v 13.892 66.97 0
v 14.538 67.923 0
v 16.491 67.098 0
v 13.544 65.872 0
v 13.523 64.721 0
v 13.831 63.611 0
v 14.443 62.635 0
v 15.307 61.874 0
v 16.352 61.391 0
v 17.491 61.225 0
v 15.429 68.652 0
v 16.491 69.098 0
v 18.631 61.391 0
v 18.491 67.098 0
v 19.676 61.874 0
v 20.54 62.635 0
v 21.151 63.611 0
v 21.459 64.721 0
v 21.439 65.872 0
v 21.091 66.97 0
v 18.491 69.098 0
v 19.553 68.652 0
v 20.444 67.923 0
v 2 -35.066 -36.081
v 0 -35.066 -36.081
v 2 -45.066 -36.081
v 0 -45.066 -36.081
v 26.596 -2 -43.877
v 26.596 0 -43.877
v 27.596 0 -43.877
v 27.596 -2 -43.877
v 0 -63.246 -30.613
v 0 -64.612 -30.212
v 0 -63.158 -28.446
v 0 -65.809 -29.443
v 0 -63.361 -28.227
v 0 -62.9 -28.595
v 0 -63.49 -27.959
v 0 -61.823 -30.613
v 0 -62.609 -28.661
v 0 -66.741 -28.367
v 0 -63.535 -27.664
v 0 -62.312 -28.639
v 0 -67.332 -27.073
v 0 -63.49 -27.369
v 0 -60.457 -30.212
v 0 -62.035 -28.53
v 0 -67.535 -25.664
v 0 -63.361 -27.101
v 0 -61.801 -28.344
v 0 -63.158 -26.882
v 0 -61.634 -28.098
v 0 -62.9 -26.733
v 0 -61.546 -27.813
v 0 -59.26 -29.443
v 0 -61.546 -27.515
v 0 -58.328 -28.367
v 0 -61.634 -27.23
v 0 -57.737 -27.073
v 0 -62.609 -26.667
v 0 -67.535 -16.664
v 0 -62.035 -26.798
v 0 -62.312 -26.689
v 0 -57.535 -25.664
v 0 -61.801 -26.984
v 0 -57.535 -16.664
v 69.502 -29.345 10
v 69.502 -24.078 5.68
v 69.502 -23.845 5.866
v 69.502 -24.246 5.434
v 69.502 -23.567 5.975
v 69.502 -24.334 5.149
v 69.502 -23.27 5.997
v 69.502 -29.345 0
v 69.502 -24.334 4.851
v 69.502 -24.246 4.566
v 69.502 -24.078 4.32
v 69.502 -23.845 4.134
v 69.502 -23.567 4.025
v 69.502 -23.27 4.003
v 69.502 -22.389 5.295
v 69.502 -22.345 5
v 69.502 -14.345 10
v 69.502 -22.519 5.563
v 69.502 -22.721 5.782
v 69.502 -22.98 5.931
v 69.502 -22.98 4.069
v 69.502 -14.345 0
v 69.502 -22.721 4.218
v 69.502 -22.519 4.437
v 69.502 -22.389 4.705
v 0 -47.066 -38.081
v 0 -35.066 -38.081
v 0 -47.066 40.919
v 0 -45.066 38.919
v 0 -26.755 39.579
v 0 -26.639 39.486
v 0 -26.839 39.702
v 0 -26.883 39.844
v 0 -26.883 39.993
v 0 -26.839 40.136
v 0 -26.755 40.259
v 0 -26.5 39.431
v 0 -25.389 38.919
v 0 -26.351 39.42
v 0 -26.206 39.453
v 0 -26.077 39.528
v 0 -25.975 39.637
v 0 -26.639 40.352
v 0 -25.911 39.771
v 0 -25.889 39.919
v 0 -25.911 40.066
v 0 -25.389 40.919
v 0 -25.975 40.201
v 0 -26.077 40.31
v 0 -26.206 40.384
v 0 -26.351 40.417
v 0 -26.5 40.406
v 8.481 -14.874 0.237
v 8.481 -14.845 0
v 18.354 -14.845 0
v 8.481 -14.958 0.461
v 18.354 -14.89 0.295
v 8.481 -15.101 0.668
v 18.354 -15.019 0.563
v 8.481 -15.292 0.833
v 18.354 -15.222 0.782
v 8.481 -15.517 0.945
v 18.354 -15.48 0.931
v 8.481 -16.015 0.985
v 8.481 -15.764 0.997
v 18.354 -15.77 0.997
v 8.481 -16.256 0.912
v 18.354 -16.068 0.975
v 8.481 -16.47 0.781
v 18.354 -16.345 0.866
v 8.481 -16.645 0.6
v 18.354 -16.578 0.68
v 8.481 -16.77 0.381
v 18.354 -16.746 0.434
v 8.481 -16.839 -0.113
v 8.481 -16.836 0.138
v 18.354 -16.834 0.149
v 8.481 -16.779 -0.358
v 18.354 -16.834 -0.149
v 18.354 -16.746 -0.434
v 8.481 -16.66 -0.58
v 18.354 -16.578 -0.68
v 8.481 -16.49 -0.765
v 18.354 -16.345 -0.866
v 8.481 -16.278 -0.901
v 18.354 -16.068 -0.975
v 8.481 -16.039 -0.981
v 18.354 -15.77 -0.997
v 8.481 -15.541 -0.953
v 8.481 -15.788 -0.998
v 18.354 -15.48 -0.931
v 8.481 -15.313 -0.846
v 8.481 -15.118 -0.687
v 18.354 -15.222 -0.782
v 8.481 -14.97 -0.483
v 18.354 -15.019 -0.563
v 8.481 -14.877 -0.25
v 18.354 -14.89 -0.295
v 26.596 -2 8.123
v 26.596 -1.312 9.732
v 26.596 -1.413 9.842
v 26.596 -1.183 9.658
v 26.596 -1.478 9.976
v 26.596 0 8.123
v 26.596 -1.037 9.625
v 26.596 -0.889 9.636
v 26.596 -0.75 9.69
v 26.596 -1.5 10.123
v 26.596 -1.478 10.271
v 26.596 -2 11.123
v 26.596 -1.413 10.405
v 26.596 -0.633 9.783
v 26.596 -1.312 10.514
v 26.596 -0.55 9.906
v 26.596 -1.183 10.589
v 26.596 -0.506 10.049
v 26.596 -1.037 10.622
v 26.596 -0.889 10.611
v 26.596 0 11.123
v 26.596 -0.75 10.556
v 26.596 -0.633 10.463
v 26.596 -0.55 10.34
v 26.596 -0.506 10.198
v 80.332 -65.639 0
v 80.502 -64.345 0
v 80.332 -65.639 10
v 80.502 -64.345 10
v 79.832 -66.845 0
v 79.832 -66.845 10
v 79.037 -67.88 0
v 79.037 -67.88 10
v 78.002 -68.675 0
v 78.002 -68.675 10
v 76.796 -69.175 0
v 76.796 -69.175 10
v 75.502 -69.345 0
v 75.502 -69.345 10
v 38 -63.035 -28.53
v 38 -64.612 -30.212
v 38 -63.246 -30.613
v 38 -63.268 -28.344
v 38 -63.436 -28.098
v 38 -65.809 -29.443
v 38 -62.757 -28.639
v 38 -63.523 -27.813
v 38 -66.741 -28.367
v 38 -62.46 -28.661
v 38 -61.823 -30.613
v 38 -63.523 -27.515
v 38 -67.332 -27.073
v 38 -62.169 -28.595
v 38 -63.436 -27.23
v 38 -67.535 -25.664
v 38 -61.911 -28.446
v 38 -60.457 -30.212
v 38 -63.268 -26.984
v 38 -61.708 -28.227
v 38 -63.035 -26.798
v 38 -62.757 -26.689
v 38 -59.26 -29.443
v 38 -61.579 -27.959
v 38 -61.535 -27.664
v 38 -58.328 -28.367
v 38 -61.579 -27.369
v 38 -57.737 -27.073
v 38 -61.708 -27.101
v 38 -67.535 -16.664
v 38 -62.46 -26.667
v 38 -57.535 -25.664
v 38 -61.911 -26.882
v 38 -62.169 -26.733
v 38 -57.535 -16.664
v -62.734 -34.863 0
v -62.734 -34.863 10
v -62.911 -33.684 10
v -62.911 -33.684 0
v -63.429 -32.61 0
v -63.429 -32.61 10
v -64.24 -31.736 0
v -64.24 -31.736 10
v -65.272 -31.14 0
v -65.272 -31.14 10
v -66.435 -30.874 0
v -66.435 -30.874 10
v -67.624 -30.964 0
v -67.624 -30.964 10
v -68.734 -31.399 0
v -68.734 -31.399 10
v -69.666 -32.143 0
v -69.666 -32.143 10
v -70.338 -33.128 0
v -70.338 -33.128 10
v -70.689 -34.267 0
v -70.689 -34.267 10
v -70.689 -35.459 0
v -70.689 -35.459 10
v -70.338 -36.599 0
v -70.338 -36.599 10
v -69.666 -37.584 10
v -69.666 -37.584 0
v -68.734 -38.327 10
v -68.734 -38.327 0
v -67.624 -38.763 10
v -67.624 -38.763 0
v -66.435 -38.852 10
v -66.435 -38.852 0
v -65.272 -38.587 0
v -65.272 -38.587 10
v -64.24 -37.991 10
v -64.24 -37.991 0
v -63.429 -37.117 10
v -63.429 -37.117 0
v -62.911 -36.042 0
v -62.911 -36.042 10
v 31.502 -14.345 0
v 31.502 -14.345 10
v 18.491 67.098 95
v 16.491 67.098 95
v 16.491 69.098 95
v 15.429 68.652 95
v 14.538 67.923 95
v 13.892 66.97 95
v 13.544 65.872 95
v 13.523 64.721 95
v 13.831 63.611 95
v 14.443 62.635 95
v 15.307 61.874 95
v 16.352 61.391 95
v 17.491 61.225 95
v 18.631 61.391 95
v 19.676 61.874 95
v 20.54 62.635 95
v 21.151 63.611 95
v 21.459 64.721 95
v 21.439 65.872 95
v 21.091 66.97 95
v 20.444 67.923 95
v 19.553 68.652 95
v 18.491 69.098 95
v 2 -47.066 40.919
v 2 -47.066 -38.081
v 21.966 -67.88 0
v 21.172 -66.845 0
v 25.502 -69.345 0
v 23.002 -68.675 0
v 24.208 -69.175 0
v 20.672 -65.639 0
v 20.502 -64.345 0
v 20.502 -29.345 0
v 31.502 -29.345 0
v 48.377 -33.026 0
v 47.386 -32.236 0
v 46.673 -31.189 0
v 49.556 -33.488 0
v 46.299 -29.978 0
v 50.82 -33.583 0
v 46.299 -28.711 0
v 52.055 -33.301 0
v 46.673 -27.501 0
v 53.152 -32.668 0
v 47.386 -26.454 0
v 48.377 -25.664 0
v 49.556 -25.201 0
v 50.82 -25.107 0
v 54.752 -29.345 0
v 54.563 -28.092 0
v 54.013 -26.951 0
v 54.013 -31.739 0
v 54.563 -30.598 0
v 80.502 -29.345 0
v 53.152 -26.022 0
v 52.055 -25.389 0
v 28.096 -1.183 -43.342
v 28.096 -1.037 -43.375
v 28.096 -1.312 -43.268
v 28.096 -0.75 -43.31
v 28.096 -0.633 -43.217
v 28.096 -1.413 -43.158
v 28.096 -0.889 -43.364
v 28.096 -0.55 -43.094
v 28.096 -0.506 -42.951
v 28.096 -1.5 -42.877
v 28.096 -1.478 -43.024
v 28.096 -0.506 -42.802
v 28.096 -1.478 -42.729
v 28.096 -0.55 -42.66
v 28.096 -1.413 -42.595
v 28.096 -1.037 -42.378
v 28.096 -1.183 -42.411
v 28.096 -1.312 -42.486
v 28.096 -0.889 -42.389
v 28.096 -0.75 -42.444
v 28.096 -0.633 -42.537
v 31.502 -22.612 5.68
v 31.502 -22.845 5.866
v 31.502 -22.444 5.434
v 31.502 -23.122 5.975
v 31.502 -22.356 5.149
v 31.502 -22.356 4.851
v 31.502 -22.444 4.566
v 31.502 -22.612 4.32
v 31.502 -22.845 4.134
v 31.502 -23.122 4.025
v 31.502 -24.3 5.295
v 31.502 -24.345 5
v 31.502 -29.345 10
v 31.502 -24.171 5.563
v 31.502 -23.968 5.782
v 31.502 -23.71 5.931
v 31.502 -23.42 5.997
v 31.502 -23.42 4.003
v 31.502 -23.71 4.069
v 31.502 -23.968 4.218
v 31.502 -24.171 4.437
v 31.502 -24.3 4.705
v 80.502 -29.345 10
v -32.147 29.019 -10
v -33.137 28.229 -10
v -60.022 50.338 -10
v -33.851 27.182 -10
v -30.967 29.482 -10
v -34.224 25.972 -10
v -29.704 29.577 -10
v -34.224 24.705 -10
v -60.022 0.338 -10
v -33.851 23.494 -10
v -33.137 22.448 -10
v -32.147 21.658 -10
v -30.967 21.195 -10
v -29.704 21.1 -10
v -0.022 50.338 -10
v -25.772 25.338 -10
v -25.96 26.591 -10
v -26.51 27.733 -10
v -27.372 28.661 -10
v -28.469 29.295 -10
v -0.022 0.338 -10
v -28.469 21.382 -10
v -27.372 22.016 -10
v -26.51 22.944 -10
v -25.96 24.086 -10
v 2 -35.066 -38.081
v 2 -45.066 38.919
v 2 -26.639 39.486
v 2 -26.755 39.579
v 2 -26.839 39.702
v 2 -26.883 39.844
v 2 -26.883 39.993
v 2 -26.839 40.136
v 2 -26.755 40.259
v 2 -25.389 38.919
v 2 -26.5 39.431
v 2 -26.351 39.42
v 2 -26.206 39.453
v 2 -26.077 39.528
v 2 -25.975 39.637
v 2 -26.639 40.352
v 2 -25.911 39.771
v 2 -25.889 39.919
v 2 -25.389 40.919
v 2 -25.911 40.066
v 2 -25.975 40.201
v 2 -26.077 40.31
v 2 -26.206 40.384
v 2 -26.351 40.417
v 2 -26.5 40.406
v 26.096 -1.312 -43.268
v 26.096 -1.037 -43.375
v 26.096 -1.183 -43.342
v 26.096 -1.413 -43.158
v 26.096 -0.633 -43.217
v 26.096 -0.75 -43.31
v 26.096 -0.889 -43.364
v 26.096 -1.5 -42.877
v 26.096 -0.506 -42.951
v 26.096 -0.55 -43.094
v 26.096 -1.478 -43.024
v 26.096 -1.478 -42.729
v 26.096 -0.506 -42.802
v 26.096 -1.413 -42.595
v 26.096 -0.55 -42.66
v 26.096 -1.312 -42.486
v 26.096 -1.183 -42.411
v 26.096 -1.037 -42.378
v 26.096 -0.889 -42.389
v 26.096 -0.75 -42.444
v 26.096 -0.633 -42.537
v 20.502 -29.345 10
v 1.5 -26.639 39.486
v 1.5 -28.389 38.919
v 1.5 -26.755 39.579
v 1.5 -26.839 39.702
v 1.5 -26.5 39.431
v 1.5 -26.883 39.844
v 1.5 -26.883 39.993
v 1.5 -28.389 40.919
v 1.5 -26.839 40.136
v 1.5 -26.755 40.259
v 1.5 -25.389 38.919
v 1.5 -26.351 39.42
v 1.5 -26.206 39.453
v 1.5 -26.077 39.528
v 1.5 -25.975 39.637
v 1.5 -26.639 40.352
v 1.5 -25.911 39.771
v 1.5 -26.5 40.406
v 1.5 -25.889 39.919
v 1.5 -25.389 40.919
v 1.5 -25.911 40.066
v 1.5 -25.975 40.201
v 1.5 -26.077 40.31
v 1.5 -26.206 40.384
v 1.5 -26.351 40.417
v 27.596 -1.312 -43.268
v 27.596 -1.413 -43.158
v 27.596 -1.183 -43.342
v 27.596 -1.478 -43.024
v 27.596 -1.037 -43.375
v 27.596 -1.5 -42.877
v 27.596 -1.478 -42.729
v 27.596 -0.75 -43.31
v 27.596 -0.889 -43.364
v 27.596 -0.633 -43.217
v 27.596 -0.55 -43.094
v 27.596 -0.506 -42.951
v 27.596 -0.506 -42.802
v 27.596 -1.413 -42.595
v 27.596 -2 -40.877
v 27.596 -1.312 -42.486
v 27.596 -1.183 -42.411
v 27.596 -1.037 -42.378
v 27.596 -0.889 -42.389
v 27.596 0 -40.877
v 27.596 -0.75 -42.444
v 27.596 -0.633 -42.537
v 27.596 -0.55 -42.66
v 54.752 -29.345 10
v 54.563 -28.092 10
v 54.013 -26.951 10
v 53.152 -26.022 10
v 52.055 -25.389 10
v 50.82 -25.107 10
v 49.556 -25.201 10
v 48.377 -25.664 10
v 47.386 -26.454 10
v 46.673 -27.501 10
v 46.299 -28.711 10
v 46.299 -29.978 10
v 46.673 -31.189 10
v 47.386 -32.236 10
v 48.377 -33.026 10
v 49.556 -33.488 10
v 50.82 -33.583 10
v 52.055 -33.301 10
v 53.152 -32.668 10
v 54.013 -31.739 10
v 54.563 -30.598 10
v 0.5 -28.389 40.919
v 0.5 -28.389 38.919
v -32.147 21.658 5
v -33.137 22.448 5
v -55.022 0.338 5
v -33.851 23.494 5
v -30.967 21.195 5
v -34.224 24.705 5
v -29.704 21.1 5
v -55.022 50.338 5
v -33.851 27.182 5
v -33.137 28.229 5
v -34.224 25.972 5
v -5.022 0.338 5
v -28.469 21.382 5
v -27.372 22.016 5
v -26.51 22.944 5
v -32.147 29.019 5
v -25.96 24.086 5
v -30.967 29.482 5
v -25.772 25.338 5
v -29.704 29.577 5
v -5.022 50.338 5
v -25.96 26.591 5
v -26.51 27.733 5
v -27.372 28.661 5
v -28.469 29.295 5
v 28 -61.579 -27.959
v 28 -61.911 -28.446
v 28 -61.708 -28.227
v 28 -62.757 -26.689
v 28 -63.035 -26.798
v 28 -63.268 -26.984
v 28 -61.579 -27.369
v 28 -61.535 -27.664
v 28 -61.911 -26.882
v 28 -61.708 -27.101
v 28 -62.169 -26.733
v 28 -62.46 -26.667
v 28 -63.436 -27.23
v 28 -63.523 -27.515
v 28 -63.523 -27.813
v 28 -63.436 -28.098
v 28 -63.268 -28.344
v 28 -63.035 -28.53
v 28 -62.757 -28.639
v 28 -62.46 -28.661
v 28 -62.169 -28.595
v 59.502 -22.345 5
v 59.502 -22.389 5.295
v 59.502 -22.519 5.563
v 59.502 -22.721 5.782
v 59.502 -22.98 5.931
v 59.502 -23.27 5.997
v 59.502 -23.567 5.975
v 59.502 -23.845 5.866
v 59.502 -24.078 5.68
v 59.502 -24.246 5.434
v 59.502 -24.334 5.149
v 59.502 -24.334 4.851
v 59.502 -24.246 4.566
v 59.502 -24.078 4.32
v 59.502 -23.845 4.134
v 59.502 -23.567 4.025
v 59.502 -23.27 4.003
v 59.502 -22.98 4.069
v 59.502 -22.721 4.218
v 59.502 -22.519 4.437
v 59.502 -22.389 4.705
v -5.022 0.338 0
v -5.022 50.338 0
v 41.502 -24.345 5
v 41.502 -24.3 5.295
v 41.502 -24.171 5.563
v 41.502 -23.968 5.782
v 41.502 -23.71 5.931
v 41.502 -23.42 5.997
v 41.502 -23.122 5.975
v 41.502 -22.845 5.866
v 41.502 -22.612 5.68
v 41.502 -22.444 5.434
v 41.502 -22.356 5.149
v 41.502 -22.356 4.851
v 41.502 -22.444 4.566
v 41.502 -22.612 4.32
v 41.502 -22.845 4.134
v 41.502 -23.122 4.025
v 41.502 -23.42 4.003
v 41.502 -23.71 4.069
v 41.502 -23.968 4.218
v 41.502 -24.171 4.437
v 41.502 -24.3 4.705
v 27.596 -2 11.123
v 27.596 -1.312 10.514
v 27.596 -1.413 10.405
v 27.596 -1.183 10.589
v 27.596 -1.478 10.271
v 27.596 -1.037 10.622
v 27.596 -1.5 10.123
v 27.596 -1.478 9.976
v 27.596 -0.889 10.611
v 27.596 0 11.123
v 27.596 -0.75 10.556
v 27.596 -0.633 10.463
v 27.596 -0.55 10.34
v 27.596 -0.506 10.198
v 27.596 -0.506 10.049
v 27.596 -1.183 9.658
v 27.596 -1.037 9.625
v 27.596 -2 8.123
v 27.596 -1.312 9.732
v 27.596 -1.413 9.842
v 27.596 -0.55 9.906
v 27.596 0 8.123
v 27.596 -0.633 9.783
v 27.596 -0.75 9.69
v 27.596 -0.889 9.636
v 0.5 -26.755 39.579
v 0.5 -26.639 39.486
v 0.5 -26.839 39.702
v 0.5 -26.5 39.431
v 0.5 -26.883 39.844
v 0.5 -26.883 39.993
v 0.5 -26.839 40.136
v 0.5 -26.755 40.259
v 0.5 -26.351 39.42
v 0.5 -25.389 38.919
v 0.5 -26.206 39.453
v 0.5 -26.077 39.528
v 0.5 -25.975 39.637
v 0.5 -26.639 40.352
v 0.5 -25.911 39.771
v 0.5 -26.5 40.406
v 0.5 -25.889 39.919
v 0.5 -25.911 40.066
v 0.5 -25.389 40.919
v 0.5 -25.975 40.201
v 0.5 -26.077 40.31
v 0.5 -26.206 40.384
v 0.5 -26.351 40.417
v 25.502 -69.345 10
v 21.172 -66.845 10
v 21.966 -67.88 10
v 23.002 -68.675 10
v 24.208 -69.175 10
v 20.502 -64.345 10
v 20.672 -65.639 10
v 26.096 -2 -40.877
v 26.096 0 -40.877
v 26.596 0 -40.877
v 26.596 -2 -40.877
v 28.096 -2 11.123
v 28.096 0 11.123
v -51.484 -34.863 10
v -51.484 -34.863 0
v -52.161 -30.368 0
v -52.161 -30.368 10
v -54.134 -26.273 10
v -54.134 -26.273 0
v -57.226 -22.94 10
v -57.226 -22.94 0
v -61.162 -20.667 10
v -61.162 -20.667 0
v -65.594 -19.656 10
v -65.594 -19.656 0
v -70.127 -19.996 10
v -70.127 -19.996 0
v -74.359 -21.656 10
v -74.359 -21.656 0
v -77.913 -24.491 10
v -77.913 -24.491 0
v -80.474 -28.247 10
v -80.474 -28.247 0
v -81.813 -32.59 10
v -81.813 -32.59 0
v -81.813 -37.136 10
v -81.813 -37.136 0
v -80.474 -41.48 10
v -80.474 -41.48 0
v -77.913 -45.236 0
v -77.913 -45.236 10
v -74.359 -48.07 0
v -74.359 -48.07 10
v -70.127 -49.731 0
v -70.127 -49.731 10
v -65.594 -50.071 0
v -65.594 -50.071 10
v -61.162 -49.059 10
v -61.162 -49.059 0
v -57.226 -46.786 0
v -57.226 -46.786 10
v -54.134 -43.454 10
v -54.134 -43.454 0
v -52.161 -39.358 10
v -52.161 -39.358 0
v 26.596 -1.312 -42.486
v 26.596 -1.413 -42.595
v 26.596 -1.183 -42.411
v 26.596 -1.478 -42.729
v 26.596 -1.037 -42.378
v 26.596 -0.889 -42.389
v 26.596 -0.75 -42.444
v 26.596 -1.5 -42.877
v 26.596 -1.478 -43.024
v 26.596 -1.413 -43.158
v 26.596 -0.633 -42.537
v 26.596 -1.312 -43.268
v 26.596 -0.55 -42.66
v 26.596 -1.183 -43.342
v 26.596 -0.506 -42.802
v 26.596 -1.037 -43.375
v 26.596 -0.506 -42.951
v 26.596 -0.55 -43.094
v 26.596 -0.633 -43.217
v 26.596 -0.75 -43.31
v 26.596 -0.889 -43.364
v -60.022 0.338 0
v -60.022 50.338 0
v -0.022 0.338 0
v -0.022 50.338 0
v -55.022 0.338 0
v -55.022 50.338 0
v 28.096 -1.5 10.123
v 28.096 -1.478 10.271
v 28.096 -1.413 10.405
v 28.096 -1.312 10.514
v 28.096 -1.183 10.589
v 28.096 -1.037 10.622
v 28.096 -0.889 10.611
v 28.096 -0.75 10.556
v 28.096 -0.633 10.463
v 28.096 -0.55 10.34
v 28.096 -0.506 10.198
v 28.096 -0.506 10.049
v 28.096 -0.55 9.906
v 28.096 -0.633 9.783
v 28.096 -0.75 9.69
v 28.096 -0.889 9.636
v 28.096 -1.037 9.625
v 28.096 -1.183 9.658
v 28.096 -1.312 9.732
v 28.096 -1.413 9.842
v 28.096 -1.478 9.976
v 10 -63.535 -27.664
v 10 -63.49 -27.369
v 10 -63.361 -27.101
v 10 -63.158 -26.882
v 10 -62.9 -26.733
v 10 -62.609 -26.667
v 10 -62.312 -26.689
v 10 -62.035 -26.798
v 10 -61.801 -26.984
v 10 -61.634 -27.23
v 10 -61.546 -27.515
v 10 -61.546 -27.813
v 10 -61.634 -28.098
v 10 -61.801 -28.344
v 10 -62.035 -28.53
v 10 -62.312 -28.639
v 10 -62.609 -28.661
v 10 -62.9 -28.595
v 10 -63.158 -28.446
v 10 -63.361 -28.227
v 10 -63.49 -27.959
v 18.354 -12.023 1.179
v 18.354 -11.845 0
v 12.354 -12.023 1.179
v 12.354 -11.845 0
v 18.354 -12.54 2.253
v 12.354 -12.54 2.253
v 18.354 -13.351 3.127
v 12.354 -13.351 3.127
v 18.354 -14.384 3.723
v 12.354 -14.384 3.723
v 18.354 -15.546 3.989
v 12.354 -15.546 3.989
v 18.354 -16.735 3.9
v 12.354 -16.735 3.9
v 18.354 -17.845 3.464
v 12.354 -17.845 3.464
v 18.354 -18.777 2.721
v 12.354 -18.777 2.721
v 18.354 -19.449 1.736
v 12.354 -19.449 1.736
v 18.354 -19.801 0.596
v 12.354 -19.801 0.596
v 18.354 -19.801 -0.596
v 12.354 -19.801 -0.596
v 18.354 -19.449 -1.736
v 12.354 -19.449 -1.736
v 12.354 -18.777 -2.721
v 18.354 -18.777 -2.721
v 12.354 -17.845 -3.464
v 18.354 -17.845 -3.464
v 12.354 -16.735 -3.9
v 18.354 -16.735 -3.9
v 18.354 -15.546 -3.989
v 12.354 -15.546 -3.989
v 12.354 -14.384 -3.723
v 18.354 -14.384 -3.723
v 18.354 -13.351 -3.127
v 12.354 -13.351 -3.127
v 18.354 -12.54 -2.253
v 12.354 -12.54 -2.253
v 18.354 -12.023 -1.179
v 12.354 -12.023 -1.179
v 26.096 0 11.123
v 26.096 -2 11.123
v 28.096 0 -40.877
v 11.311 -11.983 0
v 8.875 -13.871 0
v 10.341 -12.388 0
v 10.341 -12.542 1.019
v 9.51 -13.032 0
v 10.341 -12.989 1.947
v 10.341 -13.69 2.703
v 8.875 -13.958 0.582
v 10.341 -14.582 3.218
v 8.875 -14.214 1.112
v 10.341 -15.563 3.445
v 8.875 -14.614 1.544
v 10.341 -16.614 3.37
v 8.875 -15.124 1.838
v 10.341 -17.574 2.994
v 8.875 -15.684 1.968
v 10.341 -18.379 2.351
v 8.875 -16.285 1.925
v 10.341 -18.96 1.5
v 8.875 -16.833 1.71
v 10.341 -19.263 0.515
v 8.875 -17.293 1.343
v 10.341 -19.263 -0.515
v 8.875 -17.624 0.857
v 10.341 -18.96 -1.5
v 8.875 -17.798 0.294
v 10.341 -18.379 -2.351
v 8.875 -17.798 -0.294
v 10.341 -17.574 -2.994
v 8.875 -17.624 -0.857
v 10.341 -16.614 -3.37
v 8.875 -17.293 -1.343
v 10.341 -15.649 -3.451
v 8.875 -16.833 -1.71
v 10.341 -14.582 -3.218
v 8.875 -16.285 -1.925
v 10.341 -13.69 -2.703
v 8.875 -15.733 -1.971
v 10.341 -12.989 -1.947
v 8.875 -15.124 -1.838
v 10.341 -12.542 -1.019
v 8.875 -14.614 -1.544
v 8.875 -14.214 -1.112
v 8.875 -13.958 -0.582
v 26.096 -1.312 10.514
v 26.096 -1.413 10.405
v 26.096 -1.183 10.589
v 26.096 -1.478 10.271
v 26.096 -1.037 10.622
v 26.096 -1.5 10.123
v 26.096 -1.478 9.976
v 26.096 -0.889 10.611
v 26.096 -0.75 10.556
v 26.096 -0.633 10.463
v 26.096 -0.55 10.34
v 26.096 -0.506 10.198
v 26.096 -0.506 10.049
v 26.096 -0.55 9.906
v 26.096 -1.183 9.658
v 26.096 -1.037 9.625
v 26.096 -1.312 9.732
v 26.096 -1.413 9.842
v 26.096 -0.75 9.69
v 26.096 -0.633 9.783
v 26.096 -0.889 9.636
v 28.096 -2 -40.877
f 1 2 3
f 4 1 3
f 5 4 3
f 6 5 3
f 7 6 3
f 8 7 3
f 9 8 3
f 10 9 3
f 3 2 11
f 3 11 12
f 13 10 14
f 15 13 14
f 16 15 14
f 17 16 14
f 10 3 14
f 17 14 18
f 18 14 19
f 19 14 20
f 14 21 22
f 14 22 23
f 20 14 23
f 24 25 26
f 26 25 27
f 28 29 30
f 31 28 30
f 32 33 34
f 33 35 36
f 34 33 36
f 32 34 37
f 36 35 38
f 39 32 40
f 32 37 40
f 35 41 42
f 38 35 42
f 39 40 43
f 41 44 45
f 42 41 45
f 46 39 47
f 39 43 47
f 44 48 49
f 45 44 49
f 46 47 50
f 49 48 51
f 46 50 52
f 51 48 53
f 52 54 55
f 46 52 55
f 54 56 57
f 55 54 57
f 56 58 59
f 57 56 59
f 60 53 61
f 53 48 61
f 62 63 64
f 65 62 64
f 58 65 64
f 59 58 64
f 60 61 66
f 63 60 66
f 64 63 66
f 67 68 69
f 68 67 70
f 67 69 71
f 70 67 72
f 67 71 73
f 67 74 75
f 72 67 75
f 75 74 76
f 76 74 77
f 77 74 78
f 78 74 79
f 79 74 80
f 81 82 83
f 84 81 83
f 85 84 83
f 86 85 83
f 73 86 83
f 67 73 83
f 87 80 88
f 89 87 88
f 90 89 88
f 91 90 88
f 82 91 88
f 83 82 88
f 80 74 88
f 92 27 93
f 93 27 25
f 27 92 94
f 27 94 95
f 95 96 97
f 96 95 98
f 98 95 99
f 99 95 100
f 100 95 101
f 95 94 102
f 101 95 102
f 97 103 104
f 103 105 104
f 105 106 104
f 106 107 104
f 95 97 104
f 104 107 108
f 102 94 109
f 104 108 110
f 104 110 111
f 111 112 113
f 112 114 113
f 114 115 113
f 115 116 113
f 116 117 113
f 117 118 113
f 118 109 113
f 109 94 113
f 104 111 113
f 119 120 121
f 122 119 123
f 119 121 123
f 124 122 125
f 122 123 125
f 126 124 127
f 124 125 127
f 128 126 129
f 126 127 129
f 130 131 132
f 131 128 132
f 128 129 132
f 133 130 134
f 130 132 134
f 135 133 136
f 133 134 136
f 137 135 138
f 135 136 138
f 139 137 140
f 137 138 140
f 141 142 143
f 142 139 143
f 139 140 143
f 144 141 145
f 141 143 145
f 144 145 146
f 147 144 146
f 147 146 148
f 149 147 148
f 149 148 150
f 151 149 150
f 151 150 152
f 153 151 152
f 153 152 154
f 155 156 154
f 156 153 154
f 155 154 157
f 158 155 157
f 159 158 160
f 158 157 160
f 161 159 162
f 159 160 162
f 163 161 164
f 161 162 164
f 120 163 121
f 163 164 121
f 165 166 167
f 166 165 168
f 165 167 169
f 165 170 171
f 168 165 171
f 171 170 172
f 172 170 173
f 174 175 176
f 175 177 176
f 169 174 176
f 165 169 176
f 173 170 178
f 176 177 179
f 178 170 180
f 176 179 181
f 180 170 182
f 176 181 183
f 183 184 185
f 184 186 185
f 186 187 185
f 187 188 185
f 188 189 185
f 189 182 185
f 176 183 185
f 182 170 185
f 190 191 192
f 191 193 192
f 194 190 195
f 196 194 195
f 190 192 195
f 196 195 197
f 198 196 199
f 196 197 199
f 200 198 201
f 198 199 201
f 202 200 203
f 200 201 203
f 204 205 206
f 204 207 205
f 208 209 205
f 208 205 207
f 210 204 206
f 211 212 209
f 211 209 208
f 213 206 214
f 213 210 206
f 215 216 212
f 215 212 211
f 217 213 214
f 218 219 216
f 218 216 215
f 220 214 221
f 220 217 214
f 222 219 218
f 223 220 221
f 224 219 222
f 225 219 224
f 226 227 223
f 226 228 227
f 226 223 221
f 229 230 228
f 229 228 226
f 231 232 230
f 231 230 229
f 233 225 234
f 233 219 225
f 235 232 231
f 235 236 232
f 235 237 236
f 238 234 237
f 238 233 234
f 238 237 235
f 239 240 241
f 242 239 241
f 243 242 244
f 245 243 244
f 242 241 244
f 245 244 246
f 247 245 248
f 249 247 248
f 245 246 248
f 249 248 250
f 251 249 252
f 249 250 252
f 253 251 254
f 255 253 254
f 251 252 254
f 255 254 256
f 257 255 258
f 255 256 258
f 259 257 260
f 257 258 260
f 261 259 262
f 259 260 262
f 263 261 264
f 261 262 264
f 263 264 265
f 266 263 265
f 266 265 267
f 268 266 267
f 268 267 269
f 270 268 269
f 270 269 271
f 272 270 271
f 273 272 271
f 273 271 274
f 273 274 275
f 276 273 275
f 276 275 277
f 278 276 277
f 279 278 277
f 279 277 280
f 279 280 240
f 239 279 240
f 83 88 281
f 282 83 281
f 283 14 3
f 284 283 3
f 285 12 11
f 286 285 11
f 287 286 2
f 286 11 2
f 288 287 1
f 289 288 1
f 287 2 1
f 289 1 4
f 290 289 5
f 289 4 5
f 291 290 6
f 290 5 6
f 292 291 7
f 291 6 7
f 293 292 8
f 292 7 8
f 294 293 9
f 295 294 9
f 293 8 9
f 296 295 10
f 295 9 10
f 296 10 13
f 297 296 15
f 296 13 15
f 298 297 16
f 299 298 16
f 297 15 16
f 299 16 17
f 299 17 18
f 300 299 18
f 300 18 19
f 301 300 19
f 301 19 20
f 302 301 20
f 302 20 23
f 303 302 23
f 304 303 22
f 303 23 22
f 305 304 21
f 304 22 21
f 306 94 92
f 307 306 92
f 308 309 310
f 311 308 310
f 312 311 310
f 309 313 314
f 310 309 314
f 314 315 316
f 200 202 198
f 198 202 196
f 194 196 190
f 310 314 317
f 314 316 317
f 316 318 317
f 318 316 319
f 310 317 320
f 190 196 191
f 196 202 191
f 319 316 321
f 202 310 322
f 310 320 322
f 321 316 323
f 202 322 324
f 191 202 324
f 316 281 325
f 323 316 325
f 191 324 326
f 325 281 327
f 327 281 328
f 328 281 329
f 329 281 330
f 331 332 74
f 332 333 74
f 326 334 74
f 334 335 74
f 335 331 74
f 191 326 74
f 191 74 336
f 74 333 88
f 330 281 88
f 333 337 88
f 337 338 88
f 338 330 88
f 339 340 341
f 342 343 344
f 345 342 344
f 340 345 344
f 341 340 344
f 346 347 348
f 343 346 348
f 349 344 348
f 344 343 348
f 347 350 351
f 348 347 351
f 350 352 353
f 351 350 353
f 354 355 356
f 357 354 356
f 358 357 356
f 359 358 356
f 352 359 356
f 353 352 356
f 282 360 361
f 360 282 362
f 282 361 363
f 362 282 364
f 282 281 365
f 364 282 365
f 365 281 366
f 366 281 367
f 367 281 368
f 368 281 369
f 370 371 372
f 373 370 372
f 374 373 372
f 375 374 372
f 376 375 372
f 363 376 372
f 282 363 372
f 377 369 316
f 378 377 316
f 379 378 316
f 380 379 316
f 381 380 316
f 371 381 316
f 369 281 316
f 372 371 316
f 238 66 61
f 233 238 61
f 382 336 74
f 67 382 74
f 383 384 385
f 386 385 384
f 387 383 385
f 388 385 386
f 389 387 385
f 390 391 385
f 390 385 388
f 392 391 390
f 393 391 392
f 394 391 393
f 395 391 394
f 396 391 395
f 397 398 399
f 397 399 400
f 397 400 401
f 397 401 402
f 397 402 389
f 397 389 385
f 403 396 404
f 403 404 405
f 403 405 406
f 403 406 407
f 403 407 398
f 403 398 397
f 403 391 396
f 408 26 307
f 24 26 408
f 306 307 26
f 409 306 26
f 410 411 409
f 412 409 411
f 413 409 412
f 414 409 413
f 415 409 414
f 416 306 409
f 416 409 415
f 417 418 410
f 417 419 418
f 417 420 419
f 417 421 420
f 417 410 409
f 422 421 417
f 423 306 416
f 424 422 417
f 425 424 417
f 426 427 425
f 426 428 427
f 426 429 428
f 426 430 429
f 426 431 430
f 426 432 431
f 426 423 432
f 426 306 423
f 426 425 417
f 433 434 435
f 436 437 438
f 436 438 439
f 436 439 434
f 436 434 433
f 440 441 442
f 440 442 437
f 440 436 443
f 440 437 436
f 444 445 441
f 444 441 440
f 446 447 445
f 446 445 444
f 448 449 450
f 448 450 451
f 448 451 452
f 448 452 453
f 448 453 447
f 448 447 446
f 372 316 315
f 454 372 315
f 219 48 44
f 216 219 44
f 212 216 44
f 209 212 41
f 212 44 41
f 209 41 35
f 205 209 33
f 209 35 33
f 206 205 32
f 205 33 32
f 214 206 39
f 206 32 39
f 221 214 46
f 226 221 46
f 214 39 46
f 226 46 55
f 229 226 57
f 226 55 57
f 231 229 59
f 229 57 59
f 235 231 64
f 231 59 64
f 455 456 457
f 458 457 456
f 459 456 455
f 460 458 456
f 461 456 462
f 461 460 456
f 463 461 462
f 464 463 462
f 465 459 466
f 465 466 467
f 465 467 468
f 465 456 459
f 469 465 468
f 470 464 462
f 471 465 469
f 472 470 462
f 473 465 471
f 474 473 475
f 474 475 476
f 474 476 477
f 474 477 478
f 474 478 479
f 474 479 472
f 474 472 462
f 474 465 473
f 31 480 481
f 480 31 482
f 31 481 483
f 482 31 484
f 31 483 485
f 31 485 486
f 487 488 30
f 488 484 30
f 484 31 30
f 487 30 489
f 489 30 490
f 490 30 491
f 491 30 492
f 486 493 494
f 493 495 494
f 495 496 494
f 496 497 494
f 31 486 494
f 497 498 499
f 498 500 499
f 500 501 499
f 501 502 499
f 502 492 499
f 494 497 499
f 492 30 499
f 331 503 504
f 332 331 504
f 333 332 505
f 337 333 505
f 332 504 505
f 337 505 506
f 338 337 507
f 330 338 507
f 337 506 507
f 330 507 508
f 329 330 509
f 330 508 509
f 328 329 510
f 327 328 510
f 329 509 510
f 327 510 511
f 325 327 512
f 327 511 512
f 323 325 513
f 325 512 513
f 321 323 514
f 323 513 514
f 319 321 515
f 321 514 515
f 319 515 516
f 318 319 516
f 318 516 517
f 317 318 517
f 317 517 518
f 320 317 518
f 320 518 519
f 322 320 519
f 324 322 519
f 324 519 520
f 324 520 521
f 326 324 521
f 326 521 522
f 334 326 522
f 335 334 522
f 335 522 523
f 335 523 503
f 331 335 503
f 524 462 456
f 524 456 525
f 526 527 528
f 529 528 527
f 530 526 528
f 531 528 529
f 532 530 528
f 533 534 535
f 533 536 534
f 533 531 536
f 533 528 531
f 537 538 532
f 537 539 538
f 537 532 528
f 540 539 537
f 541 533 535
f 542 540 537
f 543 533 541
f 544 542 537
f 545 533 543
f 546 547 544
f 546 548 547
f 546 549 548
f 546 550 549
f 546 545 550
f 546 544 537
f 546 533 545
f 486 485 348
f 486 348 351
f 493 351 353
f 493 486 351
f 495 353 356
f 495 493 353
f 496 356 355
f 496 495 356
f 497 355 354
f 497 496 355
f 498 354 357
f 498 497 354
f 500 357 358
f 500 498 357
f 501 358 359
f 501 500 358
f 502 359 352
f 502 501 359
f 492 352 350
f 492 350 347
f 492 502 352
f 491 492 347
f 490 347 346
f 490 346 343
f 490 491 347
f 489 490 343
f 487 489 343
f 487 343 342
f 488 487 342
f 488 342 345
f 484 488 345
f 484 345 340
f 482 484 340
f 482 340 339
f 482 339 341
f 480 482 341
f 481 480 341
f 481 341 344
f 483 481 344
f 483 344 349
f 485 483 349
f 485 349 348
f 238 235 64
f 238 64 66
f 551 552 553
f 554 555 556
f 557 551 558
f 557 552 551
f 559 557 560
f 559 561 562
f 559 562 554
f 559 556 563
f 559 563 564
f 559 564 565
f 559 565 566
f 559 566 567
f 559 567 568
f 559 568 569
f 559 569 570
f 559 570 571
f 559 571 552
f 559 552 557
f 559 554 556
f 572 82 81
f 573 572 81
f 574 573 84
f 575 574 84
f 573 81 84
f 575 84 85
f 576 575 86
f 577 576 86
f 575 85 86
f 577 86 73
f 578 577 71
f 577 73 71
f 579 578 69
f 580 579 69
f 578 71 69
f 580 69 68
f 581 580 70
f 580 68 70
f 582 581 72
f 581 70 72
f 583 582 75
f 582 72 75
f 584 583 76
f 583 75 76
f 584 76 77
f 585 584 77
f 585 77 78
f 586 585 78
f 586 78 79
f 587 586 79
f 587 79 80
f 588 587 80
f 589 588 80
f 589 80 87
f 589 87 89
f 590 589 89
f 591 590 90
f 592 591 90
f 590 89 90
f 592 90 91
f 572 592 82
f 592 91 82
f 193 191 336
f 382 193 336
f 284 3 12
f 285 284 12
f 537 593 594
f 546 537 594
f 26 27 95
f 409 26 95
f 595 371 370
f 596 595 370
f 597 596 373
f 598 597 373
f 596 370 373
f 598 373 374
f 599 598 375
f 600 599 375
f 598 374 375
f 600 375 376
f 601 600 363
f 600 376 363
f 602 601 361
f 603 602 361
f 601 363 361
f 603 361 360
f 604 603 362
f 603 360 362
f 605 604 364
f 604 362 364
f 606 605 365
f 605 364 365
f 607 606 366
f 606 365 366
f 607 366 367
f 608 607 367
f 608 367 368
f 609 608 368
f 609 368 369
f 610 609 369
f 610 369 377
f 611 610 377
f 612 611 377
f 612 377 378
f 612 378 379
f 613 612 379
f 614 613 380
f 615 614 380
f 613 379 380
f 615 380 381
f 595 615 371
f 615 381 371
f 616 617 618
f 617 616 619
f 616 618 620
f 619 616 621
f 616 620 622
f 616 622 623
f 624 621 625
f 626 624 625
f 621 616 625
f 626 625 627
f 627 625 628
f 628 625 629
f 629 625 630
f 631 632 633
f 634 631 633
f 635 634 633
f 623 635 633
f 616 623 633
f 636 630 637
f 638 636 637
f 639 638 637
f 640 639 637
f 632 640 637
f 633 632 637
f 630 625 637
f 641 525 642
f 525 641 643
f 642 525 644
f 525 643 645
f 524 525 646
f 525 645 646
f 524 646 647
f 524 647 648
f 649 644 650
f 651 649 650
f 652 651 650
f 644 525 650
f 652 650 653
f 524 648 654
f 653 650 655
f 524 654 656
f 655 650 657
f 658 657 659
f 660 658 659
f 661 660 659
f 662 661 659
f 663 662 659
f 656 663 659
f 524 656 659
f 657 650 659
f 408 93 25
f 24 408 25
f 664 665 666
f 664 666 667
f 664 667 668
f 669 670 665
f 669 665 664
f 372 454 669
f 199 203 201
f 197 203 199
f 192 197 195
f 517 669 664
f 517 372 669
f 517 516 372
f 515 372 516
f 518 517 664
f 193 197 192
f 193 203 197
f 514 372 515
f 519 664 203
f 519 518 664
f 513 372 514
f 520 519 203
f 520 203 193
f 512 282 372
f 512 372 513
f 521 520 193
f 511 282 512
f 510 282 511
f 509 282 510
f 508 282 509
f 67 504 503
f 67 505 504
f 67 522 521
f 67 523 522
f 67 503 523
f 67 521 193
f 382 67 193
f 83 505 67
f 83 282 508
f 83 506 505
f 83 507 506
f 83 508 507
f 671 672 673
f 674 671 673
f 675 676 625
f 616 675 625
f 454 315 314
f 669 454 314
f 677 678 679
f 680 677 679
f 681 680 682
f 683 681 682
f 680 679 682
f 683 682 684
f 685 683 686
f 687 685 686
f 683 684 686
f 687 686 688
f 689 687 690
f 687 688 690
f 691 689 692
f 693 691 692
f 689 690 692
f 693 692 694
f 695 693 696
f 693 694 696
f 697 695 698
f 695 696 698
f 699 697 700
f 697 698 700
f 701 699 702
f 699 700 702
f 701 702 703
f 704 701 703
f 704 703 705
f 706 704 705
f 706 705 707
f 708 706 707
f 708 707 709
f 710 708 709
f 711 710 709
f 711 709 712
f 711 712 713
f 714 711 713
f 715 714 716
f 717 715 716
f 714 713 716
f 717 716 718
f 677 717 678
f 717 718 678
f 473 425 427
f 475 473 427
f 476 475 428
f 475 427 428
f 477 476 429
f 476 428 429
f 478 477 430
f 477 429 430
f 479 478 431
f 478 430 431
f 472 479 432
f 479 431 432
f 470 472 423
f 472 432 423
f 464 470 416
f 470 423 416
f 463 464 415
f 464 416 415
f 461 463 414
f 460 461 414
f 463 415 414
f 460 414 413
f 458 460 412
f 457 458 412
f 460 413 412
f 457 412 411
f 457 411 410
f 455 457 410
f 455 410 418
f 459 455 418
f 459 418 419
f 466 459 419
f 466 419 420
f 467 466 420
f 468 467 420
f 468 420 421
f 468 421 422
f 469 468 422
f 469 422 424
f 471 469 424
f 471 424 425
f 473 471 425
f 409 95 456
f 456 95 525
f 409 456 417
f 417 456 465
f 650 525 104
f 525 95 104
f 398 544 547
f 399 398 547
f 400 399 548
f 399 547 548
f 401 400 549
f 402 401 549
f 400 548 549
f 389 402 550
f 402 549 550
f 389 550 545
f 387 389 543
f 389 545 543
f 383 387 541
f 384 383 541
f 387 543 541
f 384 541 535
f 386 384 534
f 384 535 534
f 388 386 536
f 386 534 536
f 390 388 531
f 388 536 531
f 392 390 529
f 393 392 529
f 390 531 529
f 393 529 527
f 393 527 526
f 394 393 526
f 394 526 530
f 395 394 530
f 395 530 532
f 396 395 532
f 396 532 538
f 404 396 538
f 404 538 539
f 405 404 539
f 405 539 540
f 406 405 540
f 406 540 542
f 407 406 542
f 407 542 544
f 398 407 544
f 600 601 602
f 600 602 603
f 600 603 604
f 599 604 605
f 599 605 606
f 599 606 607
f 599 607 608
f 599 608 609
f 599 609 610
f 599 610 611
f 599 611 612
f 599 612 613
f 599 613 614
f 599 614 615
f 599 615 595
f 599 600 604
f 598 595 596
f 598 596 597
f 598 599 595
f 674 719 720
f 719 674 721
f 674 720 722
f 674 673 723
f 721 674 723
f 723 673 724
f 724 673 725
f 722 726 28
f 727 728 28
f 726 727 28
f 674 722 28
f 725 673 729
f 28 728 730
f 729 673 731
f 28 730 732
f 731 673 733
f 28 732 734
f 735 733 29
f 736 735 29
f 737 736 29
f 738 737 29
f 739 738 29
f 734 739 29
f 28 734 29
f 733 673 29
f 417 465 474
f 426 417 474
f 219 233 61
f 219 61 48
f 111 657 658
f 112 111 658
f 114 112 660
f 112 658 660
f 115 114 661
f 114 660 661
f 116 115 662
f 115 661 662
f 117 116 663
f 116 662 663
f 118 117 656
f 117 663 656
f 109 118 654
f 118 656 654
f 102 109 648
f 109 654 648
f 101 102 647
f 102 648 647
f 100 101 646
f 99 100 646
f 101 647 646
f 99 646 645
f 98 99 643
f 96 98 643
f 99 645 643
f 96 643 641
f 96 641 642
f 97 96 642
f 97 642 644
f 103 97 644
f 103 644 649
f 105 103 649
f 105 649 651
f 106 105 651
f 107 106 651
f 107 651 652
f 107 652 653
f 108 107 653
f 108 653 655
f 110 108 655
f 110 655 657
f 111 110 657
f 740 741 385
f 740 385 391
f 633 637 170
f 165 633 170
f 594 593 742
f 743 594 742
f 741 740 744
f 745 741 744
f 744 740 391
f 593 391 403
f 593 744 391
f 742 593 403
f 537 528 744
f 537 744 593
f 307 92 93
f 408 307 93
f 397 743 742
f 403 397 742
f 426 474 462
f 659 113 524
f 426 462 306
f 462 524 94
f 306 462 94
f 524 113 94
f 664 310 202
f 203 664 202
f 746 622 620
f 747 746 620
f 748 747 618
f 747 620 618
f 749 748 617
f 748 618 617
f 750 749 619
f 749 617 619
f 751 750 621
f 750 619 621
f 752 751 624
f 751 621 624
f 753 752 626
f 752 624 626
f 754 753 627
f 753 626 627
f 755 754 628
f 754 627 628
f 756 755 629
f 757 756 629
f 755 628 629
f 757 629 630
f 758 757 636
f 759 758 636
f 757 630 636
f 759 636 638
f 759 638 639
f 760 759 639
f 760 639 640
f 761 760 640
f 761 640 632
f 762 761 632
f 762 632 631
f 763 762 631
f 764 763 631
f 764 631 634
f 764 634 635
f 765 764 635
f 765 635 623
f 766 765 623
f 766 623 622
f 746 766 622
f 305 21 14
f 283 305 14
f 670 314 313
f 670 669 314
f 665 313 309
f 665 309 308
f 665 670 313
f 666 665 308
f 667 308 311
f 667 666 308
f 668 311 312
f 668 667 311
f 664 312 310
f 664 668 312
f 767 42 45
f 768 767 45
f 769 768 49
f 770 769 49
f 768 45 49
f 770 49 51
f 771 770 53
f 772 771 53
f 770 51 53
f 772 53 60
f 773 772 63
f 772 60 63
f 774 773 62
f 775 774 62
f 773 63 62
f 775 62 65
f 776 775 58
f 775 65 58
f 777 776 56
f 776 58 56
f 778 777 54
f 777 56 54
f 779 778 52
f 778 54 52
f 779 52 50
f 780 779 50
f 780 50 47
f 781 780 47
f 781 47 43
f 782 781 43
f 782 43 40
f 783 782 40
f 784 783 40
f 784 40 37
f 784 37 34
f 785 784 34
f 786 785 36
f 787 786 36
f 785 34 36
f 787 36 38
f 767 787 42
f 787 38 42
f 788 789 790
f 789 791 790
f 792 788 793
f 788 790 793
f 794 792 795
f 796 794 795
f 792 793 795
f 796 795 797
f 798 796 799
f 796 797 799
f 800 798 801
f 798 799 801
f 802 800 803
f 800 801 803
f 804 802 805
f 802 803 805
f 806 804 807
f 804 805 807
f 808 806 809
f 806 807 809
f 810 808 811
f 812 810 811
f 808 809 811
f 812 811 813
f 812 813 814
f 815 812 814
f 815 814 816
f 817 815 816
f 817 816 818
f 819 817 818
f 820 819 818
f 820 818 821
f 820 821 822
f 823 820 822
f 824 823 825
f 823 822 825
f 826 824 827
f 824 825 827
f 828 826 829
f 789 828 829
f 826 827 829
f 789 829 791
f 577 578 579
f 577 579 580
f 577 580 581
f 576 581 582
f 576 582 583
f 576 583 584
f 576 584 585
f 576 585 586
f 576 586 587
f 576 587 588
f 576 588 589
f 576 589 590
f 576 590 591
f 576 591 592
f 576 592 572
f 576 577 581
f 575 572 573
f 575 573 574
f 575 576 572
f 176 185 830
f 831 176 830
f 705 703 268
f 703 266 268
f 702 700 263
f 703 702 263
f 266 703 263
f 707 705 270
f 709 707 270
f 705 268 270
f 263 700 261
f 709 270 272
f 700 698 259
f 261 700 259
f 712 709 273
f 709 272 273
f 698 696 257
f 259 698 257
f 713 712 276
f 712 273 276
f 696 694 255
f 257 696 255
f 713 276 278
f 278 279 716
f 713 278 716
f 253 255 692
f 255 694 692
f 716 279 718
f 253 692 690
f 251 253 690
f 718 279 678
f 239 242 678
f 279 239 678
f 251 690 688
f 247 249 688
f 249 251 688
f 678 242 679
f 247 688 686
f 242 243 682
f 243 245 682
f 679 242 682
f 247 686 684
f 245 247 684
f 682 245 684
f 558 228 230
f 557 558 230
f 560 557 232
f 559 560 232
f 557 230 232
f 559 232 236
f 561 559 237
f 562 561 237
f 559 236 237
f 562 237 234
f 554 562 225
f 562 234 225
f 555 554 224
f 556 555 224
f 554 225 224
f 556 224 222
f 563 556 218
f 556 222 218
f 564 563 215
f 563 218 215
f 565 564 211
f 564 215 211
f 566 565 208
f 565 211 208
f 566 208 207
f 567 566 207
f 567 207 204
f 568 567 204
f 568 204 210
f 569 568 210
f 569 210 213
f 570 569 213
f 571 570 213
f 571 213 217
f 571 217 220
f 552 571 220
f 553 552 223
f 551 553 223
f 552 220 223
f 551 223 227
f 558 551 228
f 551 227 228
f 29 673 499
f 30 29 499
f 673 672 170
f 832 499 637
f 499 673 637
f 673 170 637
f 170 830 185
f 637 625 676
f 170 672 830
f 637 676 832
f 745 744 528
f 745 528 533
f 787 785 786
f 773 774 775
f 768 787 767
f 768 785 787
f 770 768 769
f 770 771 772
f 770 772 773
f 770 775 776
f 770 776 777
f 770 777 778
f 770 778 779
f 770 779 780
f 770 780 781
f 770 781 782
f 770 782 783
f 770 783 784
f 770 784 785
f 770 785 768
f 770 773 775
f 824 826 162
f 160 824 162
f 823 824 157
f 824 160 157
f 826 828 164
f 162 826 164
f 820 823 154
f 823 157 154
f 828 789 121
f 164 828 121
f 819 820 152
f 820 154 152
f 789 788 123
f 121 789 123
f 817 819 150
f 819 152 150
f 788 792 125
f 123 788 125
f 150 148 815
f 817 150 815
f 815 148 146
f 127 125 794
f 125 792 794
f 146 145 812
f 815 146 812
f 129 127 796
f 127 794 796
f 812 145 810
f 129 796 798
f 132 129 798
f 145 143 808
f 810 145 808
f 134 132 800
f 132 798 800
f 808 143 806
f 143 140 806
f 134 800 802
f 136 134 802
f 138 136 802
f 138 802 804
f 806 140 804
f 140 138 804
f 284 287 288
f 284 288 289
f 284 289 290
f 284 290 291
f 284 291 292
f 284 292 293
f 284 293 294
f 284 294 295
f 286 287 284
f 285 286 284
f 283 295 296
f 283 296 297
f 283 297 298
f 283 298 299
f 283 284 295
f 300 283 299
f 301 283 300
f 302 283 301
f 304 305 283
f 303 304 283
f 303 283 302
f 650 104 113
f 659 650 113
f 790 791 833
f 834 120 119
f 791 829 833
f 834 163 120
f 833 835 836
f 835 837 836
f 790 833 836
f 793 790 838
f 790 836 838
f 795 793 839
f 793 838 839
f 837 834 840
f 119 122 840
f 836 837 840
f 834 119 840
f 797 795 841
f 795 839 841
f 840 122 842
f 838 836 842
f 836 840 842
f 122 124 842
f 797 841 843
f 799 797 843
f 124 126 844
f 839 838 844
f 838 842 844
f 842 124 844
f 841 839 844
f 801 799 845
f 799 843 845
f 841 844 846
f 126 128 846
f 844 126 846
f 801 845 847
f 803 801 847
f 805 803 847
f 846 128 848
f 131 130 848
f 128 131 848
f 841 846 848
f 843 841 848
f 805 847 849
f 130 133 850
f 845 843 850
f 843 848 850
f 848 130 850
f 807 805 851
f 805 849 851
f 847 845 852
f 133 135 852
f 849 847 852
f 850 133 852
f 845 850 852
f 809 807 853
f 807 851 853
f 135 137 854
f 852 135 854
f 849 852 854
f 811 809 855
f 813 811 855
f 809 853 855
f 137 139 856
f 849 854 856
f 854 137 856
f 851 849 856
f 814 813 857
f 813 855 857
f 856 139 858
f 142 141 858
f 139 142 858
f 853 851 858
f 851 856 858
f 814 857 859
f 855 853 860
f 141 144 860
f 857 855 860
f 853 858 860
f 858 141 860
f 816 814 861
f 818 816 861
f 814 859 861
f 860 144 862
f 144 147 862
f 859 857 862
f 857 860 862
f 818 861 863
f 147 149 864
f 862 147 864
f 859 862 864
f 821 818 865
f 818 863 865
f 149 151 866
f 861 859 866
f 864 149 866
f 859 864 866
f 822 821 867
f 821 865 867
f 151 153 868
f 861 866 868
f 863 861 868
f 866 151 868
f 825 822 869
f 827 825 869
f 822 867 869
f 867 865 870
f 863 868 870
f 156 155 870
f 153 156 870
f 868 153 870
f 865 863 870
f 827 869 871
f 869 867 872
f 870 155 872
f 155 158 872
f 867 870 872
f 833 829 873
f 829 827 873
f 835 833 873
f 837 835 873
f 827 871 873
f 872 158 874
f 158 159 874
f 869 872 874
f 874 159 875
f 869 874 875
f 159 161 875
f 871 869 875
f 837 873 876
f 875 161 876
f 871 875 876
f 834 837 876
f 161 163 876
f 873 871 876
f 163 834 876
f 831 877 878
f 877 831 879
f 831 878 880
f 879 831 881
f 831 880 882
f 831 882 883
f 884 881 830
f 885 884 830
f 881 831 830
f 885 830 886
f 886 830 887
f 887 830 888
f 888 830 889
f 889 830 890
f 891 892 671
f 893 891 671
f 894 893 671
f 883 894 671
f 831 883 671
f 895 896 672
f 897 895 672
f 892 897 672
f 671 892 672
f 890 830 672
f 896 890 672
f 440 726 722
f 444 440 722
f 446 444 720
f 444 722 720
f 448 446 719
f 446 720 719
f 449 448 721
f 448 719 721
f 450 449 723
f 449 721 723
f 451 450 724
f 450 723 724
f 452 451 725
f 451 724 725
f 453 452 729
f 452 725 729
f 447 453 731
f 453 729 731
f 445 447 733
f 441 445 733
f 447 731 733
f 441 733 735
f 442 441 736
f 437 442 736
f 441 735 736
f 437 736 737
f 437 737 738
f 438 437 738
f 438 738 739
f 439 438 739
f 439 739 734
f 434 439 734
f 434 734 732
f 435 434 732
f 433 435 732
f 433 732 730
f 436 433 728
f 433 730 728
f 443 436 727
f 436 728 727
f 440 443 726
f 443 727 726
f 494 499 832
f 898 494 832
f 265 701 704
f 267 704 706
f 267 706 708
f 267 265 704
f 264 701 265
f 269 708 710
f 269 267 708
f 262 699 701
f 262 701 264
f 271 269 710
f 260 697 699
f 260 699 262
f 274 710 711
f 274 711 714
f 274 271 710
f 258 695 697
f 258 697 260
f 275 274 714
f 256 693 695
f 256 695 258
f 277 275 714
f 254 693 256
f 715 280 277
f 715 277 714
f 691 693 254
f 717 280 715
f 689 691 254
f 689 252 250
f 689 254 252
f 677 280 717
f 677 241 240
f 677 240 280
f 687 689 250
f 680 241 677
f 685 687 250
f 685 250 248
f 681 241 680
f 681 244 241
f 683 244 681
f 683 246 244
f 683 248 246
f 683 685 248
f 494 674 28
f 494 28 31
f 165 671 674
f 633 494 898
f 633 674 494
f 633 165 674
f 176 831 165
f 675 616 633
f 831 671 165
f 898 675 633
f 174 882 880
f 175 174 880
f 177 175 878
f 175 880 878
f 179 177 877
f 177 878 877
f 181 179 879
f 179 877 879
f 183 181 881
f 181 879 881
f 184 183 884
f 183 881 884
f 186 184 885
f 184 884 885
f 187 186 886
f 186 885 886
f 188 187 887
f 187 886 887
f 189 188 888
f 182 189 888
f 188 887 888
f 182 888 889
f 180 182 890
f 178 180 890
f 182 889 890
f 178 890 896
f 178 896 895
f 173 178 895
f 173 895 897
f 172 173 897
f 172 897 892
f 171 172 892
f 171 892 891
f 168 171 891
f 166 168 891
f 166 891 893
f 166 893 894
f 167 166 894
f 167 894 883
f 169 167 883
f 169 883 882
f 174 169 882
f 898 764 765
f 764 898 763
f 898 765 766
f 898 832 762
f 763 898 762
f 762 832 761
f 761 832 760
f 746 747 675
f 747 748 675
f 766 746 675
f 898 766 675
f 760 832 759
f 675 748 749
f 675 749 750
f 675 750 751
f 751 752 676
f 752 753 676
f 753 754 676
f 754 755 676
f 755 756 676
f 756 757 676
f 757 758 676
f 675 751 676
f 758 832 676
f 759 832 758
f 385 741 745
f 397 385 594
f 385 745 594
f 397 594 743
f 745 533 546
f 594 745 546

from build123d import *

# Parameters (mm, degrees)
F0_W           = 50
F0_H           = 50
F1_DEPTH       = 5
F2_W           = 60
F2_H           = 50
F3_DEPTH       = 10
F4_R           = 4.25
F5_DEPTH       = 15.001
F7_DEPTH       = 95
F9_DEPTH       = 2
F10_W          = 1
F10_H          = 2
F11_DEPTH      = 3
F12_R          = 0.5
F13_DEPTH      = 62.022552
F15_DEPTH      = 2
F16_R          = 0.5
F17_DEPTH      = 2.001
F18_R          = 0.5
F19_DEPTH      = 0.5
F19_DEPTH_BACK = 1.5
F20_R          = 15.25
F21_DEPTH      = 10
F22_R          = 4
F23_DEPTH      = 53.877672
F24_R          = 4.25
F25_DEPTH      = 25
F26_R          = 1
F27_DEPTH      = 10
F28_R          = 1
F29_DEPTH      = 10
F31_DEPTH      = 38
F32_R          = 1
F33_DEPTH      = 10
F34_R          = 1
F35_DEPTH      = 10
F36_R          = 5
F39_R          = 1
F40_DEPTH      = 25


with BuildPart() as f1:
    # F0 (on Top) → F1 (new body)
    with BuildSketch(Plane.XY):
        with Locations((-30.021552, 25.338422)):
            Rectangle(F0_W, F0_H)
    extrude(amount=F1_DEPTH)

    # F2 (on face) → F3 (join)
    with BuildSketch(Plane(origin=(0, 0, 0), x_dir=(1, 0, 0), z_dir=(0, 0, -1))):
        with Locations((-30.021552, -25.338422)):
            Rectangle(F2_W, F2_H)
    extrude(amount=F3_DEPTH)

    # F4 (on face) → F5 (cut, through all)
    with BuildSketch(Plane.XY.offset(5)):
        with Locations((-30.021552, 25.338422)):
            Circle(F4_R)
    extrude(amount=-F5_DEPTH, mode=Mode.SUBTRACT)


with BuildPart() as f7:
    # F6 (on Top) → F7 (new body)
    with BuildSketch(Plane.XY):
        with BuildLine():
            Line((16.491243, 67.09788), (16.491243, 69.09788))
            ThreePointArc((16.491243, 69.09788), (17.491243, 61.224897), (18.491243, 69.09788))
            Line((18.491243, 69.09788), (18.491243, 67.09788))
            Line((18.491243, 67.09788), (16.491243, 67.09788))
        make_face()
    extrude(amount=F7_DEPTH)


with BuildPart() as f9:
    # F8 (on Right) → F9 (new body)
    with BuildSketch(Plane.YZ):
        Polygon((-47.065535, 40.918842), (-47.065535, -38.081158), (-35.065535, -38.081158), (-35.065535, -36.081158), (-45.065535, -36.081158), (-45.065535, 38.918842), (-25.388535, 38.918842), (-25.388535, 40.918842), align=None)
    extrude(amount=F9_DEPTH)

    # F10 (on face) → F11 (cut)
    with BuildSketch(Plane(origin=(0, -25.388535, 0), x_dir=(-1, 0, 0), z_dir=(0, 1, 0))):
        with Locations((-1, 39.918842)):
            Rectangle(F10_W, F10_H)
    extrude(amount=-F11_DEPTH, mode=Mode.SUBTRACT)

    # F12 (on face) → F13 (cut, through all)
    with BuildSketch(Plane.YZ.offset(2)):
        with Locations((-26.388535, 39.918842)):
            Circle(F12_R)
    extrude(amount=-F13_DEPTH, mode=Mode.SUBTRACT)


with BuildPart() as f15:
    # F14 (on Front) → F15 (new body)
    with BuildSketch(Plane.XZ):
        Polygon((26.595865, 11.123328), (26.095865, 11.123328), (26.095865, -40.876672), (26.595865, -40.876672), (26.595865, -43.876672), (27.595865, -43.876672), (27.595865, -40.876672), (28.095865, -40.876672), (28.095865, 11.123328), (27.595865, 11.123328), (27.595865, 8.123328), (26.595865, 8.123328), align=None)
    extrude(amount=F15_DEPTH)

    # F16 (on face) → F17 (cut, through all)
    with BuildSketch(Plane(origin=(26.095865, 0, 0), x_dir=(0, -1, 0), z_dir=(-1, 0, 0))):
        with Locations((1, 10.123328)):
            Circle(F16_R)
    extrude(amount=-F17_DEPTH, mode=Mode.SUBTRACT)

    # F18 (on face) → F19 (join, two sides)
    with BuildSketch(Plane(origin=(26.595865, 0, 0), x_dir=(0, -1, 0), z_dir=(-1, 0, 0))) as f19_sk:
        with Locations((1, -42.876672)):
            Circle(F18_R)
    extrude(amount=F19_DEPTH)
    extrude(f19_sk.sketch, amount=-F19_DEPTH_BACK)


with BuildPart() as f21:
    # F20 (on Top) → F21 (new body)
    with BuildSketch(Plane.XY):
        with Locations((-66.733785, -34.863252)):
            Circle(F20_R)
        Polygon((69.501953, -14.344923), (31.501953, -14.344923), (31.501953, -29.344923), (20.501953, -29.344923), (20.501953, -69.344923), (80.501953, -69.344923), (80.501953, -29.344923), (69.501953, -29.344923), align=None)
    extrude(amount=F21_DEPTH)

    # F22 (on face) → F23 (cut, through all)
    with BuildSketch(Plane.XY.offset(10)):
        with Locations((-66.733785, -34.863252)):
            Circle(F22_R)
    extrude(amount=-F23_DEPTH, mode=Mode.SUBTRACT)

    # F24 (on face) → F25 (cut)
    with BuildSketch(Plane.XY.offset(10)):
        with Locations((50.501953, -29.344923)):
            Circle(F24_R)
    extrude(amount=-F25_DEPTH, mode=Mode.SUBTRACT)

    # F26 (on face) → F27 (cut)
    with BuildSketch(Plane.YZ.offset(69.501953)):
        with Locations((-23.344923, 5)):
            Circle(F26_R)
    extrude(amount=-F27_DEPTH, mode=Mode.SUBTRACT)

    # F28 (on face) → F29 (cut)
    with BuildSketch(Plane(origin=(31.501953, 0, 0), x_dir=(0, -1, 0), z_dir=(-1, 0, 0))):
        with Locations((23.344923, 5)):
            Circle(F28_R)
    extrude(amount=-F29_DEPTH, mode=Mode.SUBTRACT)

    # F36
    f36_edges = [f21.edges().sort_by_distance(p)[0] for p in [
        (80.501953, -69.344923, 5),
        (20.501953, -69.344923, 5),
    ]]
    fillet(f36_edges, radius=F36_R)


with BuildPart() as f31:
    # F30 (on Right) → F31 (new body)
    with BuildSketch(Plane.YZ):
        with BuildLine():
            Line((-67.534549, -16.663966), (-67.534549, -25.663966))
            ThreePointArc((-67.534549, -25.663966), (-62.534549, -30.663966), (-57.534549, -25.663966))
            Line((-57.534549, -25.663966), (-57.534549, -16.663966))
            Line((-57.534549, -16.663966), (-67.534549, -16.663966))
        make_face()
    extrude(amount=F31_DEPTH)

    # F32 (on face) → F33 (cut)
    with BuildSketch(Plane(origin=(0, 0, 0), x_dir=(0, -1, 0), z_dir=(-1, 0, 0))):
        with Locations((62.534549, -27.663966)):
            Circle(F32_R)
    extrude(amount=-F33_DEPTH, mode=Mode.SUBTRACT)

    # F34 (on face) → F35 (cut)
    with BuildSketch(Plane.YZ.offset(38)):
        with Locations((-62.534549, -27.663966)):
            Circle(F34_R)
    extrude(amount=-F35_DEPTH, mode=Mode.SUBTRACT)


with BuildPart() as f38:
    # F37 (on Top) → F38 (revolve)
    with BuildSketch(Plane.XY):
        with BuildLine():
            ThreePointArc((12.353747, -11.845219), (9.52532, -13.016792), (8.353747, -15.845219))
            Line((8.353747, -15.845219), (18.353747, -15.845219))
            Line((18.353747, -15.845219), (18.353747, -11.845219))
            Line((18.353747, -11.845219), (12.353747, -11.845219))
        make_face()
    revolve(axis=Axis((13.353747, -15.845219, 0), (1, 0, 0)))

    # F39 (on face) → F40 (cut)
    with BuildSketch(Plane.YZ.offset(18.353747)):
        with Locations((-15.845219, 0)):
            Circle(F39_R)
    extrude(amount=-F40_DEPTH, mode=Mode.SUBTRACT)


solid = Compound([f1.part, f7.part, f9.part, f15.part, f21.part, f31.part, f38.part])
